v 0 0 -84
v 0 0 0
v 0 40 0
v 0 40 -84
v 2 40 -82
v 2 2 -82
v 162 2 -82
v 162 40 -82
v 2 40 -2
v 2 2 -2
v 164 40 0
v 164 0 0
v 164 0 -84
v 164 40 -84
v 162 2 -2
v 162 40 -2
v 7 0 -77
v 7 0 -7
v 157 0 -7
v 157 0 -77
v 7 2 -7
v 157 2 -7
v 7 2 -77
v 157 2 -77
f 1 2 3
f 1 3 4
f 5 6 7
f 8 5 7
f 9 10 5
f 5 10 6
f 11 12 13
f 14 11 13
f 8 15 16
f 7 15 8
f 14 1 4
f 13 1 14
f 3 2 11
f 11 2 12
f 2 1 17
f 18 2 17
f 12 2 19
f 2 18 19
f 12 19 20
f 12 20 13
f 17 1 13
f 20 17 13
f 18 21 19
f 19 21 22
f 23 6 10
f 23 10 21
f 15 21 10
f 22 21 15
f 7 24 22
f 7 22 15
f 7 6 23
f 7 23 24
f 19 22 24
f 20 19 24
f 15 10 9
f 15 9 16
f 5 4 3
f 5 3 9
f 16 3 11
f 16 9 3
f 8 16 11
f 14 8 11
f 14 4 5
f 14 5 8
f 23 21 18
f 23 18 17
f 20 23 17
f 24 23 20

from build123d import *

# Parameters (mm, degrees)
SKETCH1_W           = 164
SKETCH1_H           = 84
BOSS_EXTRUDE1_DEPTH = 40
SHELL1_T            = -2
SKETCH2_W           = 150
SKETCH2_H           = 70
CUT_EXTRUDE1_DEPTH  = 2


with BuildPart() as part:
    # Sketch1 → Boss-Extrude1 (new body)
    with BuildSketch(Plane(origin=(0, 0, 0), x_dir=(1, 0, 0), z_dir=(0, 1, 0))):
        with Locations((82, 42)):
            Rectangle(SKETCH1_W, SKETCH1_H)
    extrude(amount=BOSS_EXTRUDE1_DEPTH)

    # Shell1
    shell1_openings = [part.faces().sort_by_distance(p)[0] for p in [
        (82, 40, -42),
    ]]
    offset(amount=SHELL1_T, openings=shell1_openings, kind=Kind.INTERSECTION)

    # Sketch2 → Cut-Extrude1 (cut)
    with BuildSketch(Plane(origin=(0, 2, 0), x_dir=(1, 0, 0), z_dir=(0, 1, 0))):
        with Locations((82, 42)):
            Rectangle(SKETCH2_W, SKETCH2_H)
    extrude(amount=-CUT_EXTRUDE1_DEPTH, mode=Mode.SUBTRACT)


solid = part.part
